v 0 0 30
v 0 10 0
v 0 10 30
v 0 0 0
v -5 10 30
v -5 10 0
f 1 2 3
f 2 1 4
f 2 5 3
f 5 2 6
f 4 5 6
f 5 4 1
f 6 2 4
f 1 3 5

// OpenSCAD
// parameters
X = 10;
Y = 5;
H = 30;

module Prism(x, y, h){
    rotate([0, 270, 0]) {
         polyhedron(
             points=[[0,0,0], [h,0,0], [h,x,0], [0,x,0], [0,x,y], [h,x,y]],
             faces=[[0,1,2,3],[5,4,3,2],[0,4,5,1],[0,3,4],[5,2,1]]
             );
    }
}

// main
Prism(X, Y, H);
